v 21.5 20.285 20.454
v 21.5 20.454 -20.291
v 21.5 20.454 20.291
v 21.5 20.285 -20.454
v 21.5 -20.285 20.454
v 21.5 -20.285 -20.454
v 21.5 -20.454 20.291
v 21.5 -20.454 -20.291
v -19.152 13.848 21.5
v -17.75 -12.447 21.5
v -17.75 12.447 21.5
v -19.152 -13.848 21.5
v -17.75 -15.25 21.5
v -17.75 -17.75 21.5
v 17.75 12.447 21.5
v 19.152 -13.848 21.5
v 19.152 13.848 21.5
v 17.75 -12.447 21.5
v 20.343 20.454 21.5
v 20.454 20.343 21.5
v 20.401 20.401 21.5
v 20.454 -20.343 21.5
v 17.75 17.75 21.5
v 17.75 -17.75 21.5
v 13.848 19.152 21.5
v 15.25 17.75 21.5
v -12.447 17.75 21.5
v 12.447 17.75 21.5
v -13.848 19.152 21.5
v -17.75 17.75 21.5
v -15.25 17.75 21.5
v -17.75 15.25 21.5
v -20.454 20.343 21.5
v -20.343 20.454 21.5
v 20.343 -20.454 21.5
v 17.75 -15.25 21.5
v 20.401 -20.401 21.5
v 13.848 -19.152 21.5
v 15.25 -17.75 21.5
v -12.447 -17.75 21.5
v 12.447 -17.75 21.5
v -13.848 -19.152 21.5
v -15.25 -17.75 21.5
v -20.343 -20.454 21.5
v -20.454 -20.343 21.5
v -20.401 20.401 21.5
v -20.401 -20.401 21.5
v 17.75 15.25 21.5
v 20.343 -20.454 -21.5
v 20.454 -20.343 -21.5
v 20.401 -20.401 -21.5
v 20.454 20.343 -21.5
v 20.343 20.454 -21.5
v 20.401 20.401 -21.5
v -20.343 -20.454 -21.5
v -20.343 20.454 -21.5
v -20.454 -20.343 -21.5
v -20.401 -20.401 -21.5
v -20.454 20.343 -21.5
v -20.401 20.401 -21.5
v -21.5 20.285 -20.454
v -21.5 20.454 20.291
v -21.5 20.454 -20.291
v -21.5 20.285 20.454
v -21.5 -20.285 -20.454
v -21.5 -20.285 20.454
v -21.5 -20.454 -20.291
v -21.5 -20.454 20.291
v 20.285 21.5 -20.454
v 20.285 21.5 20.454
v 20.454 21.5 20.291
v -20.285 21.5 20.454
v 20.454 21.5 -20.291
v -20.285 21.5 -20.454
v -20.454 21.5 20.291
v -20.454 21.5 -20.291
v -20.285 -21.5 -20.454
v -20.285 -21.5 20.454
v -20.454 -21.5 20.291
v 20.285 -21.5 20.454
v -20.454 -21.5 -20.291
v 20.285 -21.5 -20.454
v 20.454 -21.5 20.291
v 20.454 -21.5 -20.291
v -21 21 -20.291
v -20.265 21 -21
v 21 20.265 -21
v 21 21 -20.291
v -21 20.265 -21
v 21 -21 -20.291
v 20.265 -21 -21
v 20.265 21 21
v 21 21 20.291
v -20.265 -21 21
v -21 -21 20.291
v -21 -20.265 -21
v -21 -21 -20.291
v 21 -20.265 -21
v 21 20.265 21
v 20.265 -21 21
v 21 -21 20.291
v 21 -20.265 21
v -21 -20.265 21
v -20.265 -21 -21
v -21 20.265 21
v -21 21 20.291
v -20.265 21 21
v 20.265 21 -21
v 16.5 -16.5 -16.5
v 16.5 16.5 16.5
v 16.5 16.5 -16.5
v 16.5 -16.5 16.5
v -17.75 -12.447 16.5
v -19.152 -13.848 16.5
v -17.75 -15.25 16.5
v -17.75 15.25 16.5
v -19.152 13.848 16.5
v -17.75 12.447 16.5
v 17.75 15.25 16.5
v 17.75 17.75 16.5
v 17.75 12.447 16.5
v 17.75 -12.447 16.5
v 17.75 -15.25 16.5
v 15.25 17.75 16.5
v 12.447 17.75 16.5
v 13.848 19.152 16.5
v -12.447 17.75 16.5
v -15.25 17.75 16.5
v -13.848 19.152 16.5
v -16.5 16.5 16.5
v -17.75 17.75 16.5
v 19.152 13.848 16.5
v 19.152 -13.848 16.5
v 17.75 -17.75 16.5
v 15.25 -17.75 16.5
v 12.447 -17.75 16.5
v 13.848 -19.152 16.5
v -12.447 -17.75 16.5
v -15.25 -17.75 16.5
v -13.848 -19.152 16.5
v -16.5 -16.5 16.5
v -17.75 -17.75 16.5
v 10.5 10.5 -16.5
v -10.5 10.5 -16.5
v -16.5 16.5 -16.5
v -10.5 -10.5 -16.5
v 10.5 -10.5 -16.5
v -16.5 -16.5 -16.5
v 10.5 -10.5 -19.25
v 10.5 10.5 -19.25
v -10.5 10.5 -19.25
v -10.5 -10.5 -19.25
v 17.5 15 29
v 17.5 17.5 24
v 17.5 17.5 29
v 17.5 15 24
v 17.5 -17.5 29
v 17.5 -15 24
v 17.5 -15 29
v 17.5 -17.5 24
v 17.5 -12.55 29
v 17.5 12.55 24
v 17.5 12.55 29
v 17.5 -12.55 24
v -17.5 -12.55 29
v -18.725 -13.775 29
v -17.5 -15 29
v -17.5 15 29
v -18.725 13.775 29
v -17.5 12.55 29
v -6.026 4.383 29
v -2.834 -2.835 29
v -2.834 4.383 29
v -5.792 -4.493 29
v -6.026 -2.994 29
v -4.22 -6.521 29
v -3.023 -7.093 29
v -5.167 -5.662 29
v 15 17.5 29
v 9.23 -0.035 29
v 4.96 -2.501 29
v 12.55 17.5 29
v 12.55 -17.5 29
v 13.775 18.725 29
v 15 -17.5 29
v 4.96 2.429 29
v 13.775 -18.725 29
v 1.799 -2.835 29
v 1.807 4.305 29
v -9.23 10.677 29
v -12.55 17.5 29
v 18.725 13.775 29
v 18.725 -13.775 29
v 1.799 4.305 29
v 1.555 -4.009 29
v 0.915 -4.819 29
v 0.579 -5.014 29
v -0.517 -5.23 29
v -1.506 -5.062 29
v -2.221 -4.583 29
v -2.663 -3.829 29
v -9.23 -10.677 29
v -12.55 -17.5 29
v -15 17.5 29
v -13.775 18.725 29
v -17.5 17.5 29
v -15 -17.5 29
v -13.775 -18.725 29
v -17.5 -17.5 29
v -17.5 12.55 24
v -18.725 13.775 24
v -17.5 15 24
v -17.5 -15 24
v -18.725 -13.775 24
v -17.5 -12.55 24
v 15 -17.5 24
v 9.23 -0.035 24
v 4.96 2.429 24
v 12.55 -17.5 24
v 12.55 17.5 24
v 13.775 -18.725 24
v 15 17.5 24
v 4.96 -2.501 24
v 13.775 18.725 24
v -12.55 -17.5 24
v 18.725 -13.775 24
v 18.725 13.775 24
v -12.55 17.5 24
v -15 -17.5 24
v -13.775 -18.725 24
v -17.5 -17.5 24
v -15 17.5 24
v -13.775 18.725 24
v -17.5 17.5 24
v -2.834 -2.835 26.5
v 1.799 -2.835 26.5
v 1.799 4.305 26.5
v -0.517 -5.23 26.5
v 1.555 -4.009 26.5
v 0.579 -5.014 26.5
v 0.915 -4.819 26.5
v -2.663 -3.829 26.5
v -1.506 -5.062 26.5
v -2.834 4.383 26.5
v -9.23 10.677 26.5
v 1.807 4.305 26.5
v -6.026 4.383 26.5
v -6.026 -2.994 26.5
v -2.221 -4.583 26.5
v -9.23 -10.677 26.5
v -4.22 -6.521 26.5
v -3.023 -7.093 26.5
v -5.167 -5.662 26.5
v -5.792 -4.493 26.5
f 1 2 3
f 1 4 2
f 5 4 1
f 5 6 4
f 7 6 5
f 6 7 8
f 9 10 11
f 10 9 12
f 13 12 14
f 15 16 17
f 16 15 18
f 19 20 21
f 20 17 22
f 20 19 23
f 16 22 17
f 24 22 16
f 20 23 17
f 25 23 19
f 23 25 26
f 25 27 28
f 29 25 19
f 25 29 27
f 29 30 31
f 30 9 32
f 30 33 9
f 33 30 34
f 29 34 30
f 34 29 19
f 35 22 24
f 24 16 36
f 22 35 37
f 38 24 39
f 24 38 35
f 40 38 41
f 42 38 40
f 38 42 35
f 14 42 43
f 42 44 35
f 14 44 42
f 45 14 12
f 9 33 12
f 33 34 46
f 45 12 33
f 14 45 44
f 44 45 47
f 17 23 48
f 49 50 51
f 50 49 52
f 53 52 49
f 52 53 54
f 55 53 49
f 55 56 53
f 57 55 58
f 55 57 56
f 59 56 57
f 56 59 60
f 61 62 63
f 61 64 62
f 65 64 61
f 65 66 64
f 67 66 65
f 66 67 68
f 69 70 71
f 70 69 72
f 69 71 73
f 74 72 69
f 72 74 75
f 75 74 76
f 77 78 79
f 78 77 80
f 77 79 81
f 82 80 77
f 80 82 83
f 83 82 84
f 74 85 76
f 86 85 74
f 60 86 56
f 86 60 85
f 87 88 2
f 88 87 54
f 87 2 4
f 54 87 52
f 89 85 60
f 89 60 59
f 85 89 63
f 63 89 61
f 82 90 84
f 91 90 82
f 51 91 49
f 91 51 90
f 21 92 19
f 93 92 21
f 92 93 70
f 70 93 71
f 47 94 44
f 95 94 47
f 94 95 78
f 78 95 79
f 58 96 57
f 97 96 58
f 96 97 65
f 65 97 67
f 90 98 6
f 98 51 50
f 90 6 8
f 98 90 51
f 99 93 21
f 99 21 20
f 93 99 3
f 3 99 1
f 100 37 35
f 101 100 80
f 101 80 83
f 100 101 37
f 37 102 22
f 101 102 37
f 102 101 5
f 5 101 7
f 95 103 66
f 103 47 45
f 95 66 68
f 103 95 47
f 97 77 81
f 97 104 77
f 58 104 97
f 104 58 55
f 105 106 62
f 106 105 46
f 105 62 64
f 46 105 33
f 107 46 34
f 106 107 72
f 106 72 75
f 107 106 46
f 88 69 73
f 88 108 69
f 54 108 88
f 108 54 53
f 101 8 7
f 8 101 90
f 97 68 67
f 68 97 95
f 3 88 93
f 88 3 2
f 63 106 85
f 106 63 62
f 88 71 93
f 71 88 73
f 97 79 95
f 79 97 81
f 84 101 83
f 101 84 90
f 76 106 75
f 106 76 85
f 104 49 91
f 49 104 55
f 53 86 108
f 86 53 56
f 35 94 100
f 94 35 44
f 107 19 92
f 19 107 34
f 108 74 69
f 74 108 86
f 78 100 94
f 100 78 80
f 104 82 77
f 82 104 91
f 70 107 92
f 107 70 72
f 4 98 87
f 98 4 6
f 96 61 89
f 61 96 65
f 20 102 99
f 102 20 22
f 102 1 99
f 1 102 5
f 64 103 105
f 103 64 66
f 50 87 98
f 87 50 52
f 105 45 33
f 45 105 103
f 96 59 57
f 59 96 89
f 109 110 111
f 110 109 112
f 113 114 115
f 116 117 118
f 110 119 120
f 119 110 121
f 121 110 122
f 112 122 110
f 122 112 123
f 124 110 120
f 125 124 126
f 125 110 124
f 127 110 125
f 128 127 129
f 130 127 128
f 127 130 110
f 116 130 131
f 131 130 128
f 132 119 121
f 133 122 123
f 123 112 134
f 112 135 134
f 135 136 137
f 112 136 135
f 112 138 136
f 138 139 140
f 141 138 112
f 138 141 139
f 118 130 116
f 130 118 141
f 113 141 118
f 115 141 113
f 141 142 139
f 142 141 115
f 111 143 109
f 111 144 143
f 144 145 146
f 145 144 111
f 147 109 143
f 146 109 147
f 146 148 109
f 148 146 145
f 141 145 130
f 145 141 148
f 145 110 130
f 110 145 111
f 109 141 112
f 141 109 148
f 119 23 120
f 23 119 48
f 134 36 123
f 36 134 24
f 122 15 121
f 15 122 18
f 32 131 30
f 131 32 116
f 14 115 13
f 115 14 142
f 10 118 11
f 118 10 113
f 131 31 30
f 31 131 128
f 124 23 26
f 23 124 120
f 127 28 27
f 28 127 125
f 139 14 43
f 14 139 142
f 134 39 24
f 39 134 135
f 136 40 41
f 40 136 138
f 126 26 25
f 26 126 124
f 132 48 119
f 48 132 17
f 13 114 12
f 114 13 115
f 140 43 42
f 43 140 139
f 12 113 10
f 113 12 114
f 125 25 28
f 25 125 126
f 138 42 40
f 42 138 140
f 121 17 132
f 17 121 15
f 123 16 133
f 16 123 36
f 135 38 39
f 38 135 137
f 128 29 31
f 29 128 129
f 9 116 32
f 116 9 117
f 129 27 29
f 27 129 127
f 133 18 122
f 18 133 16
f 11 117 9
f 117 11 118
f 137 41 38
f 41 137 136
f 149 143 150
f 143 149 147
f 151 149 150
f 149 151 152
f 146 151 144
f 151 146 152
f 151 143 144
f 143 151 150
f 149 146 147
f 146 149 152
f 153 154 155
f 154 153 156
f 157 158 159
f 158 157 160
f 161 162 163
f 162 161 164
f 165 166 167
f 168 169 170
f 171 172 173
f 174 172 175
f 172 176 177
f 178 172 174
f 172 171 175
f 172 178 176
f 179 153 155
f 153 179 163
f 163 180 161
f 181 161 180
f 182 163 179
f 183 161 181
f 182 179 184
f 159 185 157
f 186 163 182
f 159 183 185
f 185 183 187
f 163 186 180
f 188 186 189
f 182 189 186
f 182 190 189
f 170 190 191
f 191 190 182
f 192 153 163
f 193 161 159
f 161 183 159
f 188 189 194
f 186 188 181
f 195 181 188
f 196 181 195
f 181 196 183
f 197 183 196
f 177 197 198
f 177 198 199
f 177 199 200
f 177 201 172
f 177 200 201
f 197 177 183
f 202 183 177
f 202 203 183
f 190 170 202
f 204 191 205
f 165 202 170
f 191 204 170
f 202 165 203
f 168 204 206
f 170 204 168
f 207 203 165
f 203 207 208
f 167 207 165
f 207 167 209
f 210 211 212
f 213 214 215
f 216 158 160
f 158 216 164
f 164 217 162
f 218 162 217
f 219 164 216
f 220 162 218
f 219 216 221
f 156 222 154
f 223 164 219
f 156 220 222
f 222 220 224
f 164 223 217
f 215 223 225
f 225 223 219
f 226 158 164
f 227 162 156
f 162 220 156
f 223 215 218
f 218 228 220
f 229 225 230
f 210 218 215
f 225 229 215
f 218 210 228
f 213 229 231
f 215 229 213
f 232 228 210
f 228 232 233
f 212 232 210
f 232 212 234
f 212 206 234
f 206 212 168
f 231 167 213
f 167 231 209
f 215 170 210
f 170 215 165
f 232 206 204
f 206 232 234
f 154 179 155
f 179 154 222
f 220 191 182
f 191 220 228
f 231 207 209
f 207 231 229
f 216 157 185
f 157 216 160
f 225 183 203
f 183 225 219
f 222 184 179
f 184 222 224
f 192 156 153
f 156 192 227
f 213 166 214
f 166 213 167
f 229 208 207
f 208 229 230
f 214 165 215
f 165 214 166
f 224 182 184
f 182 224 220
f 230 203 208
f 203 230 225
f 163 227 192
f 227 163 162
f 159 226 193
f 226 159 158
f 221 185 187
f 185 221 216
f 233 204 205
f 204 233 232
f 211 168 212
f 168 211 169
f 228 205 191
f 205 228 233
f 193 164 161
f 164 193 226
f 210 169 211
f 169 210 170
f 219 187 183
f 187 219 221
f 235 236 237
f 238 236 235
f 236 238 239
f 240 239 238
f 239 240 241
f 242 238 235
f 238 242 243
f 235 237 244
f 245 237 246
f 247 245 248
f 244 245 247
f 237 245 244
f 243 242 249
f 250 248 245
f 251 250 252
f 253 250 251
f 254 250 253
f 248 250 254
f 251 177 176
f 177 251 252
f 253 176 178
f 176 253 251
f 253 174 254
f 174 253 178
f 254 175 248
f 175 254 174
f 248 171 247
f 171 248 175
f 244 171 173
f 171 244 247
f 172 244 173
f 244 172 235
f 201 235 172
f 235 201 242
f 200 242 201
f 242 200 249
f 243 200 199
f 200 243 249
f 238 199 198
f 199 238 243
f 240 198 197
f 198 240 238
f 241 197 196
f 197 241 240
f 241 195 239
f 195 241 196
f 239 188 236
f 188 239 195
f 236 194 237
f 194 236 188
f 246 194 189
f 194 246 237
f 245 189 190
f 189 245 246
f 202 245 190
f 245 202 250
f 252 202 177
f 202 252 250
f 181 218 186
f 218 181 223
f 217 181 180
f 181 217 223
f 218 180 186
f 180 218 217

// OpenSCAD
// file: ../resources/zcu-logo.scad
module logo_tri()
    polygon(
        points=
            [[4.96, 2.429], [4.96, -2.501], [9.23, -0.035]],
        paths=
            [[0, 1, 2, 0]]
    );

module logo_u()
    polygon(
        points=
            [[-9.23, -10.677], [-3.023, -7.093], [-4.22, -6.521], [-5.167, -5.662], [-5.792, -4.493], [-6.026, -2.994], [-6.026, 4.383], [-2.834, 4.383], [-2.834, -2.835], [-2.663, -3.829], [-2.221, -4.583], [-1.506, -5.062], [-0.517, -5.23], [0.579, -5.014], [0.915, -4.819], [1.555, -4.009], [1.799, -2.835], [1.799, 4.305], [1.807, 4.305], [-9.23, 10.677]],
        paths=
            [[0, 1, 2, 3, 4, 5, 6, 7, 8, 9, 10, 11, 12, 13, 14, 15, 16, 17, 18, 19, 0]]
    );
// main file
// Global resolution
$fs = 0.1;  // Don't generate smaller facets than 0.1 mm
$fa = 5;    // Don't generate larger angles than 5 degrees

$bf = 5;
$edge=1;
$outer_size = 33 + (2 * $bf);
$screw=10;

// Modify depending on the 3D printer accuracy
$cover_small=0.5;


// ---------------------------
// Main geometry -- select one
//boxBasic();
//boxBasic_holder();

boxUWBLogo();
//boxUWBLogo_holder();
// ---------------------------

module boxBasic() {
  difference() {
    body();
    cover();
    magnet();
  }

  coverHole();
}

module boxUWBLogo() {
  difference() {
    body();
    cover();
    magnet();
  }

  coverLogo();
}

module boxBasic_holder() {
  union() {
    difference() {
      body();
      cover();
      //magnet();
    }

    coverHole();
  
    holder();
  }
}

module boxUWBLogo_holder() {
  union() {
    difference() {
      body();
      cover();
      //magnet();
    }

    coverLogo();
  
    holder();
  }
}

module holder() {
  difference() {
    translate([0,0,(-$outer_size/2 + $bf/2)]) color("Yellow") cube([3 * $outer_size ,$outer_size, $bf], center=true);
      
    translate([-$outer_size,0,(-$outer_size/2 + $bf/2)]) color("Red") cube([$outer_size/2 ,$screw, $bf], center=true);
      
    translate([$outer_size,0,(-$outer_size/2 + $bf/2)]) color("Red") cube([$outer_size/2 ,$screw, $bf], center=true);
  }
}

module coverLogo() translate([0,0,($outer_size/2+$bf)]) {
    difference() {
        union() {
            coverBaseSmall();
            rotate([0, 0, 45])  coverXSmall();
            rotate([0, 0, -45])  coverXSmall();
        }   
        translate([0,0,$bf/4]) logo();
    }
}

module coverHole() translate([0,0,($outer_size/2+$bf)]) {
    difference() {
        union() {
            coverBaseSmall();
            rotate([0, 0, 45])  coverXSmall();
            rotate([0, 0, -45])  coverXSmall();
        }   
        translate([0,0,$bf/4]) hole();
    }
}

module body() {
  difference() {
    intersection() {
        mainCube();
        edges();
        edges2();
        rotate([0, 90, 0]) edges2();
        rotate([90, 0, 0]) edges2();
    }
    mainCubeMinus();
  }
}

module edges() {
    color("Blue") sphere($outer_size - 7);
}

module edges2() {
    cylinder(h = 2*$outer_size, r1 = sqrt(2 * ($outer_size-$edge)/2 * ($outer_size-$edge)/2), r2 = sqrt(2 * ($outer_size-$edge)/2 * ($outer_size-$edge)/2), center = true);
}

module mainCube() {
    color("Red") cube($outer_size, center=true);
}

module mainCubeMinus() {
    color("Green") cube($outer_size - (2 * $bf), center=true);
}

module mainCubeMinusMoved()  translate([$bf,$bf,$bf]) mainCubeMinus();

module cover() translate([0,0,($outer_size-$bf)/2]) {
        union() {
            coverBase();
            rotate([0, 0, 45])  coverX();
            rotate([0, 0, -45])  coverX();
        }
}

module logo() {
    include <../resources/zcu-logo.scad>;
    linear_extrude(height = $bf/2, center = true) color("Blue")logo_u();    
    hole();
}

module hole() {
    include <../resources/zcu-logo.scad>;
    linear_extrude(height = 2*$bf, center = true) color("Blue") logo_tri();
}

module coverBase() {
    color("Yellow") cube([$outer_size - (1.5 * $bf),$outer_size - (1.5 * $bf),$bf], center=true);
}

module coverBaseSmall() {
    color("Yellow") cube([$outer_size - (1.5 * $bf) - $cover_small,$outer_size - (1.5 * $bf) - $cover_small,$bf], center=true);
}

module coverX() {
    color("Red") cube([sqrt(($outer_size-2*$bf)*($outer_size-2*$bf)*2),2*$bf-$bf/2,$bf], center=true);
}

module coverXSmall() {
    color("Red") cube([sqrt(($outer_size-2*$bf-$cover_small)*($outer_size-2*$bf-$cover_small)*2),2*$bf-$bf/2-$cover_small,$bf], center=true);
}

module magnet() translate([0,0, -($outer_size-$bf-3)/2]) {
    color("Blue") cube([21,21,3.5], center=true);
}
